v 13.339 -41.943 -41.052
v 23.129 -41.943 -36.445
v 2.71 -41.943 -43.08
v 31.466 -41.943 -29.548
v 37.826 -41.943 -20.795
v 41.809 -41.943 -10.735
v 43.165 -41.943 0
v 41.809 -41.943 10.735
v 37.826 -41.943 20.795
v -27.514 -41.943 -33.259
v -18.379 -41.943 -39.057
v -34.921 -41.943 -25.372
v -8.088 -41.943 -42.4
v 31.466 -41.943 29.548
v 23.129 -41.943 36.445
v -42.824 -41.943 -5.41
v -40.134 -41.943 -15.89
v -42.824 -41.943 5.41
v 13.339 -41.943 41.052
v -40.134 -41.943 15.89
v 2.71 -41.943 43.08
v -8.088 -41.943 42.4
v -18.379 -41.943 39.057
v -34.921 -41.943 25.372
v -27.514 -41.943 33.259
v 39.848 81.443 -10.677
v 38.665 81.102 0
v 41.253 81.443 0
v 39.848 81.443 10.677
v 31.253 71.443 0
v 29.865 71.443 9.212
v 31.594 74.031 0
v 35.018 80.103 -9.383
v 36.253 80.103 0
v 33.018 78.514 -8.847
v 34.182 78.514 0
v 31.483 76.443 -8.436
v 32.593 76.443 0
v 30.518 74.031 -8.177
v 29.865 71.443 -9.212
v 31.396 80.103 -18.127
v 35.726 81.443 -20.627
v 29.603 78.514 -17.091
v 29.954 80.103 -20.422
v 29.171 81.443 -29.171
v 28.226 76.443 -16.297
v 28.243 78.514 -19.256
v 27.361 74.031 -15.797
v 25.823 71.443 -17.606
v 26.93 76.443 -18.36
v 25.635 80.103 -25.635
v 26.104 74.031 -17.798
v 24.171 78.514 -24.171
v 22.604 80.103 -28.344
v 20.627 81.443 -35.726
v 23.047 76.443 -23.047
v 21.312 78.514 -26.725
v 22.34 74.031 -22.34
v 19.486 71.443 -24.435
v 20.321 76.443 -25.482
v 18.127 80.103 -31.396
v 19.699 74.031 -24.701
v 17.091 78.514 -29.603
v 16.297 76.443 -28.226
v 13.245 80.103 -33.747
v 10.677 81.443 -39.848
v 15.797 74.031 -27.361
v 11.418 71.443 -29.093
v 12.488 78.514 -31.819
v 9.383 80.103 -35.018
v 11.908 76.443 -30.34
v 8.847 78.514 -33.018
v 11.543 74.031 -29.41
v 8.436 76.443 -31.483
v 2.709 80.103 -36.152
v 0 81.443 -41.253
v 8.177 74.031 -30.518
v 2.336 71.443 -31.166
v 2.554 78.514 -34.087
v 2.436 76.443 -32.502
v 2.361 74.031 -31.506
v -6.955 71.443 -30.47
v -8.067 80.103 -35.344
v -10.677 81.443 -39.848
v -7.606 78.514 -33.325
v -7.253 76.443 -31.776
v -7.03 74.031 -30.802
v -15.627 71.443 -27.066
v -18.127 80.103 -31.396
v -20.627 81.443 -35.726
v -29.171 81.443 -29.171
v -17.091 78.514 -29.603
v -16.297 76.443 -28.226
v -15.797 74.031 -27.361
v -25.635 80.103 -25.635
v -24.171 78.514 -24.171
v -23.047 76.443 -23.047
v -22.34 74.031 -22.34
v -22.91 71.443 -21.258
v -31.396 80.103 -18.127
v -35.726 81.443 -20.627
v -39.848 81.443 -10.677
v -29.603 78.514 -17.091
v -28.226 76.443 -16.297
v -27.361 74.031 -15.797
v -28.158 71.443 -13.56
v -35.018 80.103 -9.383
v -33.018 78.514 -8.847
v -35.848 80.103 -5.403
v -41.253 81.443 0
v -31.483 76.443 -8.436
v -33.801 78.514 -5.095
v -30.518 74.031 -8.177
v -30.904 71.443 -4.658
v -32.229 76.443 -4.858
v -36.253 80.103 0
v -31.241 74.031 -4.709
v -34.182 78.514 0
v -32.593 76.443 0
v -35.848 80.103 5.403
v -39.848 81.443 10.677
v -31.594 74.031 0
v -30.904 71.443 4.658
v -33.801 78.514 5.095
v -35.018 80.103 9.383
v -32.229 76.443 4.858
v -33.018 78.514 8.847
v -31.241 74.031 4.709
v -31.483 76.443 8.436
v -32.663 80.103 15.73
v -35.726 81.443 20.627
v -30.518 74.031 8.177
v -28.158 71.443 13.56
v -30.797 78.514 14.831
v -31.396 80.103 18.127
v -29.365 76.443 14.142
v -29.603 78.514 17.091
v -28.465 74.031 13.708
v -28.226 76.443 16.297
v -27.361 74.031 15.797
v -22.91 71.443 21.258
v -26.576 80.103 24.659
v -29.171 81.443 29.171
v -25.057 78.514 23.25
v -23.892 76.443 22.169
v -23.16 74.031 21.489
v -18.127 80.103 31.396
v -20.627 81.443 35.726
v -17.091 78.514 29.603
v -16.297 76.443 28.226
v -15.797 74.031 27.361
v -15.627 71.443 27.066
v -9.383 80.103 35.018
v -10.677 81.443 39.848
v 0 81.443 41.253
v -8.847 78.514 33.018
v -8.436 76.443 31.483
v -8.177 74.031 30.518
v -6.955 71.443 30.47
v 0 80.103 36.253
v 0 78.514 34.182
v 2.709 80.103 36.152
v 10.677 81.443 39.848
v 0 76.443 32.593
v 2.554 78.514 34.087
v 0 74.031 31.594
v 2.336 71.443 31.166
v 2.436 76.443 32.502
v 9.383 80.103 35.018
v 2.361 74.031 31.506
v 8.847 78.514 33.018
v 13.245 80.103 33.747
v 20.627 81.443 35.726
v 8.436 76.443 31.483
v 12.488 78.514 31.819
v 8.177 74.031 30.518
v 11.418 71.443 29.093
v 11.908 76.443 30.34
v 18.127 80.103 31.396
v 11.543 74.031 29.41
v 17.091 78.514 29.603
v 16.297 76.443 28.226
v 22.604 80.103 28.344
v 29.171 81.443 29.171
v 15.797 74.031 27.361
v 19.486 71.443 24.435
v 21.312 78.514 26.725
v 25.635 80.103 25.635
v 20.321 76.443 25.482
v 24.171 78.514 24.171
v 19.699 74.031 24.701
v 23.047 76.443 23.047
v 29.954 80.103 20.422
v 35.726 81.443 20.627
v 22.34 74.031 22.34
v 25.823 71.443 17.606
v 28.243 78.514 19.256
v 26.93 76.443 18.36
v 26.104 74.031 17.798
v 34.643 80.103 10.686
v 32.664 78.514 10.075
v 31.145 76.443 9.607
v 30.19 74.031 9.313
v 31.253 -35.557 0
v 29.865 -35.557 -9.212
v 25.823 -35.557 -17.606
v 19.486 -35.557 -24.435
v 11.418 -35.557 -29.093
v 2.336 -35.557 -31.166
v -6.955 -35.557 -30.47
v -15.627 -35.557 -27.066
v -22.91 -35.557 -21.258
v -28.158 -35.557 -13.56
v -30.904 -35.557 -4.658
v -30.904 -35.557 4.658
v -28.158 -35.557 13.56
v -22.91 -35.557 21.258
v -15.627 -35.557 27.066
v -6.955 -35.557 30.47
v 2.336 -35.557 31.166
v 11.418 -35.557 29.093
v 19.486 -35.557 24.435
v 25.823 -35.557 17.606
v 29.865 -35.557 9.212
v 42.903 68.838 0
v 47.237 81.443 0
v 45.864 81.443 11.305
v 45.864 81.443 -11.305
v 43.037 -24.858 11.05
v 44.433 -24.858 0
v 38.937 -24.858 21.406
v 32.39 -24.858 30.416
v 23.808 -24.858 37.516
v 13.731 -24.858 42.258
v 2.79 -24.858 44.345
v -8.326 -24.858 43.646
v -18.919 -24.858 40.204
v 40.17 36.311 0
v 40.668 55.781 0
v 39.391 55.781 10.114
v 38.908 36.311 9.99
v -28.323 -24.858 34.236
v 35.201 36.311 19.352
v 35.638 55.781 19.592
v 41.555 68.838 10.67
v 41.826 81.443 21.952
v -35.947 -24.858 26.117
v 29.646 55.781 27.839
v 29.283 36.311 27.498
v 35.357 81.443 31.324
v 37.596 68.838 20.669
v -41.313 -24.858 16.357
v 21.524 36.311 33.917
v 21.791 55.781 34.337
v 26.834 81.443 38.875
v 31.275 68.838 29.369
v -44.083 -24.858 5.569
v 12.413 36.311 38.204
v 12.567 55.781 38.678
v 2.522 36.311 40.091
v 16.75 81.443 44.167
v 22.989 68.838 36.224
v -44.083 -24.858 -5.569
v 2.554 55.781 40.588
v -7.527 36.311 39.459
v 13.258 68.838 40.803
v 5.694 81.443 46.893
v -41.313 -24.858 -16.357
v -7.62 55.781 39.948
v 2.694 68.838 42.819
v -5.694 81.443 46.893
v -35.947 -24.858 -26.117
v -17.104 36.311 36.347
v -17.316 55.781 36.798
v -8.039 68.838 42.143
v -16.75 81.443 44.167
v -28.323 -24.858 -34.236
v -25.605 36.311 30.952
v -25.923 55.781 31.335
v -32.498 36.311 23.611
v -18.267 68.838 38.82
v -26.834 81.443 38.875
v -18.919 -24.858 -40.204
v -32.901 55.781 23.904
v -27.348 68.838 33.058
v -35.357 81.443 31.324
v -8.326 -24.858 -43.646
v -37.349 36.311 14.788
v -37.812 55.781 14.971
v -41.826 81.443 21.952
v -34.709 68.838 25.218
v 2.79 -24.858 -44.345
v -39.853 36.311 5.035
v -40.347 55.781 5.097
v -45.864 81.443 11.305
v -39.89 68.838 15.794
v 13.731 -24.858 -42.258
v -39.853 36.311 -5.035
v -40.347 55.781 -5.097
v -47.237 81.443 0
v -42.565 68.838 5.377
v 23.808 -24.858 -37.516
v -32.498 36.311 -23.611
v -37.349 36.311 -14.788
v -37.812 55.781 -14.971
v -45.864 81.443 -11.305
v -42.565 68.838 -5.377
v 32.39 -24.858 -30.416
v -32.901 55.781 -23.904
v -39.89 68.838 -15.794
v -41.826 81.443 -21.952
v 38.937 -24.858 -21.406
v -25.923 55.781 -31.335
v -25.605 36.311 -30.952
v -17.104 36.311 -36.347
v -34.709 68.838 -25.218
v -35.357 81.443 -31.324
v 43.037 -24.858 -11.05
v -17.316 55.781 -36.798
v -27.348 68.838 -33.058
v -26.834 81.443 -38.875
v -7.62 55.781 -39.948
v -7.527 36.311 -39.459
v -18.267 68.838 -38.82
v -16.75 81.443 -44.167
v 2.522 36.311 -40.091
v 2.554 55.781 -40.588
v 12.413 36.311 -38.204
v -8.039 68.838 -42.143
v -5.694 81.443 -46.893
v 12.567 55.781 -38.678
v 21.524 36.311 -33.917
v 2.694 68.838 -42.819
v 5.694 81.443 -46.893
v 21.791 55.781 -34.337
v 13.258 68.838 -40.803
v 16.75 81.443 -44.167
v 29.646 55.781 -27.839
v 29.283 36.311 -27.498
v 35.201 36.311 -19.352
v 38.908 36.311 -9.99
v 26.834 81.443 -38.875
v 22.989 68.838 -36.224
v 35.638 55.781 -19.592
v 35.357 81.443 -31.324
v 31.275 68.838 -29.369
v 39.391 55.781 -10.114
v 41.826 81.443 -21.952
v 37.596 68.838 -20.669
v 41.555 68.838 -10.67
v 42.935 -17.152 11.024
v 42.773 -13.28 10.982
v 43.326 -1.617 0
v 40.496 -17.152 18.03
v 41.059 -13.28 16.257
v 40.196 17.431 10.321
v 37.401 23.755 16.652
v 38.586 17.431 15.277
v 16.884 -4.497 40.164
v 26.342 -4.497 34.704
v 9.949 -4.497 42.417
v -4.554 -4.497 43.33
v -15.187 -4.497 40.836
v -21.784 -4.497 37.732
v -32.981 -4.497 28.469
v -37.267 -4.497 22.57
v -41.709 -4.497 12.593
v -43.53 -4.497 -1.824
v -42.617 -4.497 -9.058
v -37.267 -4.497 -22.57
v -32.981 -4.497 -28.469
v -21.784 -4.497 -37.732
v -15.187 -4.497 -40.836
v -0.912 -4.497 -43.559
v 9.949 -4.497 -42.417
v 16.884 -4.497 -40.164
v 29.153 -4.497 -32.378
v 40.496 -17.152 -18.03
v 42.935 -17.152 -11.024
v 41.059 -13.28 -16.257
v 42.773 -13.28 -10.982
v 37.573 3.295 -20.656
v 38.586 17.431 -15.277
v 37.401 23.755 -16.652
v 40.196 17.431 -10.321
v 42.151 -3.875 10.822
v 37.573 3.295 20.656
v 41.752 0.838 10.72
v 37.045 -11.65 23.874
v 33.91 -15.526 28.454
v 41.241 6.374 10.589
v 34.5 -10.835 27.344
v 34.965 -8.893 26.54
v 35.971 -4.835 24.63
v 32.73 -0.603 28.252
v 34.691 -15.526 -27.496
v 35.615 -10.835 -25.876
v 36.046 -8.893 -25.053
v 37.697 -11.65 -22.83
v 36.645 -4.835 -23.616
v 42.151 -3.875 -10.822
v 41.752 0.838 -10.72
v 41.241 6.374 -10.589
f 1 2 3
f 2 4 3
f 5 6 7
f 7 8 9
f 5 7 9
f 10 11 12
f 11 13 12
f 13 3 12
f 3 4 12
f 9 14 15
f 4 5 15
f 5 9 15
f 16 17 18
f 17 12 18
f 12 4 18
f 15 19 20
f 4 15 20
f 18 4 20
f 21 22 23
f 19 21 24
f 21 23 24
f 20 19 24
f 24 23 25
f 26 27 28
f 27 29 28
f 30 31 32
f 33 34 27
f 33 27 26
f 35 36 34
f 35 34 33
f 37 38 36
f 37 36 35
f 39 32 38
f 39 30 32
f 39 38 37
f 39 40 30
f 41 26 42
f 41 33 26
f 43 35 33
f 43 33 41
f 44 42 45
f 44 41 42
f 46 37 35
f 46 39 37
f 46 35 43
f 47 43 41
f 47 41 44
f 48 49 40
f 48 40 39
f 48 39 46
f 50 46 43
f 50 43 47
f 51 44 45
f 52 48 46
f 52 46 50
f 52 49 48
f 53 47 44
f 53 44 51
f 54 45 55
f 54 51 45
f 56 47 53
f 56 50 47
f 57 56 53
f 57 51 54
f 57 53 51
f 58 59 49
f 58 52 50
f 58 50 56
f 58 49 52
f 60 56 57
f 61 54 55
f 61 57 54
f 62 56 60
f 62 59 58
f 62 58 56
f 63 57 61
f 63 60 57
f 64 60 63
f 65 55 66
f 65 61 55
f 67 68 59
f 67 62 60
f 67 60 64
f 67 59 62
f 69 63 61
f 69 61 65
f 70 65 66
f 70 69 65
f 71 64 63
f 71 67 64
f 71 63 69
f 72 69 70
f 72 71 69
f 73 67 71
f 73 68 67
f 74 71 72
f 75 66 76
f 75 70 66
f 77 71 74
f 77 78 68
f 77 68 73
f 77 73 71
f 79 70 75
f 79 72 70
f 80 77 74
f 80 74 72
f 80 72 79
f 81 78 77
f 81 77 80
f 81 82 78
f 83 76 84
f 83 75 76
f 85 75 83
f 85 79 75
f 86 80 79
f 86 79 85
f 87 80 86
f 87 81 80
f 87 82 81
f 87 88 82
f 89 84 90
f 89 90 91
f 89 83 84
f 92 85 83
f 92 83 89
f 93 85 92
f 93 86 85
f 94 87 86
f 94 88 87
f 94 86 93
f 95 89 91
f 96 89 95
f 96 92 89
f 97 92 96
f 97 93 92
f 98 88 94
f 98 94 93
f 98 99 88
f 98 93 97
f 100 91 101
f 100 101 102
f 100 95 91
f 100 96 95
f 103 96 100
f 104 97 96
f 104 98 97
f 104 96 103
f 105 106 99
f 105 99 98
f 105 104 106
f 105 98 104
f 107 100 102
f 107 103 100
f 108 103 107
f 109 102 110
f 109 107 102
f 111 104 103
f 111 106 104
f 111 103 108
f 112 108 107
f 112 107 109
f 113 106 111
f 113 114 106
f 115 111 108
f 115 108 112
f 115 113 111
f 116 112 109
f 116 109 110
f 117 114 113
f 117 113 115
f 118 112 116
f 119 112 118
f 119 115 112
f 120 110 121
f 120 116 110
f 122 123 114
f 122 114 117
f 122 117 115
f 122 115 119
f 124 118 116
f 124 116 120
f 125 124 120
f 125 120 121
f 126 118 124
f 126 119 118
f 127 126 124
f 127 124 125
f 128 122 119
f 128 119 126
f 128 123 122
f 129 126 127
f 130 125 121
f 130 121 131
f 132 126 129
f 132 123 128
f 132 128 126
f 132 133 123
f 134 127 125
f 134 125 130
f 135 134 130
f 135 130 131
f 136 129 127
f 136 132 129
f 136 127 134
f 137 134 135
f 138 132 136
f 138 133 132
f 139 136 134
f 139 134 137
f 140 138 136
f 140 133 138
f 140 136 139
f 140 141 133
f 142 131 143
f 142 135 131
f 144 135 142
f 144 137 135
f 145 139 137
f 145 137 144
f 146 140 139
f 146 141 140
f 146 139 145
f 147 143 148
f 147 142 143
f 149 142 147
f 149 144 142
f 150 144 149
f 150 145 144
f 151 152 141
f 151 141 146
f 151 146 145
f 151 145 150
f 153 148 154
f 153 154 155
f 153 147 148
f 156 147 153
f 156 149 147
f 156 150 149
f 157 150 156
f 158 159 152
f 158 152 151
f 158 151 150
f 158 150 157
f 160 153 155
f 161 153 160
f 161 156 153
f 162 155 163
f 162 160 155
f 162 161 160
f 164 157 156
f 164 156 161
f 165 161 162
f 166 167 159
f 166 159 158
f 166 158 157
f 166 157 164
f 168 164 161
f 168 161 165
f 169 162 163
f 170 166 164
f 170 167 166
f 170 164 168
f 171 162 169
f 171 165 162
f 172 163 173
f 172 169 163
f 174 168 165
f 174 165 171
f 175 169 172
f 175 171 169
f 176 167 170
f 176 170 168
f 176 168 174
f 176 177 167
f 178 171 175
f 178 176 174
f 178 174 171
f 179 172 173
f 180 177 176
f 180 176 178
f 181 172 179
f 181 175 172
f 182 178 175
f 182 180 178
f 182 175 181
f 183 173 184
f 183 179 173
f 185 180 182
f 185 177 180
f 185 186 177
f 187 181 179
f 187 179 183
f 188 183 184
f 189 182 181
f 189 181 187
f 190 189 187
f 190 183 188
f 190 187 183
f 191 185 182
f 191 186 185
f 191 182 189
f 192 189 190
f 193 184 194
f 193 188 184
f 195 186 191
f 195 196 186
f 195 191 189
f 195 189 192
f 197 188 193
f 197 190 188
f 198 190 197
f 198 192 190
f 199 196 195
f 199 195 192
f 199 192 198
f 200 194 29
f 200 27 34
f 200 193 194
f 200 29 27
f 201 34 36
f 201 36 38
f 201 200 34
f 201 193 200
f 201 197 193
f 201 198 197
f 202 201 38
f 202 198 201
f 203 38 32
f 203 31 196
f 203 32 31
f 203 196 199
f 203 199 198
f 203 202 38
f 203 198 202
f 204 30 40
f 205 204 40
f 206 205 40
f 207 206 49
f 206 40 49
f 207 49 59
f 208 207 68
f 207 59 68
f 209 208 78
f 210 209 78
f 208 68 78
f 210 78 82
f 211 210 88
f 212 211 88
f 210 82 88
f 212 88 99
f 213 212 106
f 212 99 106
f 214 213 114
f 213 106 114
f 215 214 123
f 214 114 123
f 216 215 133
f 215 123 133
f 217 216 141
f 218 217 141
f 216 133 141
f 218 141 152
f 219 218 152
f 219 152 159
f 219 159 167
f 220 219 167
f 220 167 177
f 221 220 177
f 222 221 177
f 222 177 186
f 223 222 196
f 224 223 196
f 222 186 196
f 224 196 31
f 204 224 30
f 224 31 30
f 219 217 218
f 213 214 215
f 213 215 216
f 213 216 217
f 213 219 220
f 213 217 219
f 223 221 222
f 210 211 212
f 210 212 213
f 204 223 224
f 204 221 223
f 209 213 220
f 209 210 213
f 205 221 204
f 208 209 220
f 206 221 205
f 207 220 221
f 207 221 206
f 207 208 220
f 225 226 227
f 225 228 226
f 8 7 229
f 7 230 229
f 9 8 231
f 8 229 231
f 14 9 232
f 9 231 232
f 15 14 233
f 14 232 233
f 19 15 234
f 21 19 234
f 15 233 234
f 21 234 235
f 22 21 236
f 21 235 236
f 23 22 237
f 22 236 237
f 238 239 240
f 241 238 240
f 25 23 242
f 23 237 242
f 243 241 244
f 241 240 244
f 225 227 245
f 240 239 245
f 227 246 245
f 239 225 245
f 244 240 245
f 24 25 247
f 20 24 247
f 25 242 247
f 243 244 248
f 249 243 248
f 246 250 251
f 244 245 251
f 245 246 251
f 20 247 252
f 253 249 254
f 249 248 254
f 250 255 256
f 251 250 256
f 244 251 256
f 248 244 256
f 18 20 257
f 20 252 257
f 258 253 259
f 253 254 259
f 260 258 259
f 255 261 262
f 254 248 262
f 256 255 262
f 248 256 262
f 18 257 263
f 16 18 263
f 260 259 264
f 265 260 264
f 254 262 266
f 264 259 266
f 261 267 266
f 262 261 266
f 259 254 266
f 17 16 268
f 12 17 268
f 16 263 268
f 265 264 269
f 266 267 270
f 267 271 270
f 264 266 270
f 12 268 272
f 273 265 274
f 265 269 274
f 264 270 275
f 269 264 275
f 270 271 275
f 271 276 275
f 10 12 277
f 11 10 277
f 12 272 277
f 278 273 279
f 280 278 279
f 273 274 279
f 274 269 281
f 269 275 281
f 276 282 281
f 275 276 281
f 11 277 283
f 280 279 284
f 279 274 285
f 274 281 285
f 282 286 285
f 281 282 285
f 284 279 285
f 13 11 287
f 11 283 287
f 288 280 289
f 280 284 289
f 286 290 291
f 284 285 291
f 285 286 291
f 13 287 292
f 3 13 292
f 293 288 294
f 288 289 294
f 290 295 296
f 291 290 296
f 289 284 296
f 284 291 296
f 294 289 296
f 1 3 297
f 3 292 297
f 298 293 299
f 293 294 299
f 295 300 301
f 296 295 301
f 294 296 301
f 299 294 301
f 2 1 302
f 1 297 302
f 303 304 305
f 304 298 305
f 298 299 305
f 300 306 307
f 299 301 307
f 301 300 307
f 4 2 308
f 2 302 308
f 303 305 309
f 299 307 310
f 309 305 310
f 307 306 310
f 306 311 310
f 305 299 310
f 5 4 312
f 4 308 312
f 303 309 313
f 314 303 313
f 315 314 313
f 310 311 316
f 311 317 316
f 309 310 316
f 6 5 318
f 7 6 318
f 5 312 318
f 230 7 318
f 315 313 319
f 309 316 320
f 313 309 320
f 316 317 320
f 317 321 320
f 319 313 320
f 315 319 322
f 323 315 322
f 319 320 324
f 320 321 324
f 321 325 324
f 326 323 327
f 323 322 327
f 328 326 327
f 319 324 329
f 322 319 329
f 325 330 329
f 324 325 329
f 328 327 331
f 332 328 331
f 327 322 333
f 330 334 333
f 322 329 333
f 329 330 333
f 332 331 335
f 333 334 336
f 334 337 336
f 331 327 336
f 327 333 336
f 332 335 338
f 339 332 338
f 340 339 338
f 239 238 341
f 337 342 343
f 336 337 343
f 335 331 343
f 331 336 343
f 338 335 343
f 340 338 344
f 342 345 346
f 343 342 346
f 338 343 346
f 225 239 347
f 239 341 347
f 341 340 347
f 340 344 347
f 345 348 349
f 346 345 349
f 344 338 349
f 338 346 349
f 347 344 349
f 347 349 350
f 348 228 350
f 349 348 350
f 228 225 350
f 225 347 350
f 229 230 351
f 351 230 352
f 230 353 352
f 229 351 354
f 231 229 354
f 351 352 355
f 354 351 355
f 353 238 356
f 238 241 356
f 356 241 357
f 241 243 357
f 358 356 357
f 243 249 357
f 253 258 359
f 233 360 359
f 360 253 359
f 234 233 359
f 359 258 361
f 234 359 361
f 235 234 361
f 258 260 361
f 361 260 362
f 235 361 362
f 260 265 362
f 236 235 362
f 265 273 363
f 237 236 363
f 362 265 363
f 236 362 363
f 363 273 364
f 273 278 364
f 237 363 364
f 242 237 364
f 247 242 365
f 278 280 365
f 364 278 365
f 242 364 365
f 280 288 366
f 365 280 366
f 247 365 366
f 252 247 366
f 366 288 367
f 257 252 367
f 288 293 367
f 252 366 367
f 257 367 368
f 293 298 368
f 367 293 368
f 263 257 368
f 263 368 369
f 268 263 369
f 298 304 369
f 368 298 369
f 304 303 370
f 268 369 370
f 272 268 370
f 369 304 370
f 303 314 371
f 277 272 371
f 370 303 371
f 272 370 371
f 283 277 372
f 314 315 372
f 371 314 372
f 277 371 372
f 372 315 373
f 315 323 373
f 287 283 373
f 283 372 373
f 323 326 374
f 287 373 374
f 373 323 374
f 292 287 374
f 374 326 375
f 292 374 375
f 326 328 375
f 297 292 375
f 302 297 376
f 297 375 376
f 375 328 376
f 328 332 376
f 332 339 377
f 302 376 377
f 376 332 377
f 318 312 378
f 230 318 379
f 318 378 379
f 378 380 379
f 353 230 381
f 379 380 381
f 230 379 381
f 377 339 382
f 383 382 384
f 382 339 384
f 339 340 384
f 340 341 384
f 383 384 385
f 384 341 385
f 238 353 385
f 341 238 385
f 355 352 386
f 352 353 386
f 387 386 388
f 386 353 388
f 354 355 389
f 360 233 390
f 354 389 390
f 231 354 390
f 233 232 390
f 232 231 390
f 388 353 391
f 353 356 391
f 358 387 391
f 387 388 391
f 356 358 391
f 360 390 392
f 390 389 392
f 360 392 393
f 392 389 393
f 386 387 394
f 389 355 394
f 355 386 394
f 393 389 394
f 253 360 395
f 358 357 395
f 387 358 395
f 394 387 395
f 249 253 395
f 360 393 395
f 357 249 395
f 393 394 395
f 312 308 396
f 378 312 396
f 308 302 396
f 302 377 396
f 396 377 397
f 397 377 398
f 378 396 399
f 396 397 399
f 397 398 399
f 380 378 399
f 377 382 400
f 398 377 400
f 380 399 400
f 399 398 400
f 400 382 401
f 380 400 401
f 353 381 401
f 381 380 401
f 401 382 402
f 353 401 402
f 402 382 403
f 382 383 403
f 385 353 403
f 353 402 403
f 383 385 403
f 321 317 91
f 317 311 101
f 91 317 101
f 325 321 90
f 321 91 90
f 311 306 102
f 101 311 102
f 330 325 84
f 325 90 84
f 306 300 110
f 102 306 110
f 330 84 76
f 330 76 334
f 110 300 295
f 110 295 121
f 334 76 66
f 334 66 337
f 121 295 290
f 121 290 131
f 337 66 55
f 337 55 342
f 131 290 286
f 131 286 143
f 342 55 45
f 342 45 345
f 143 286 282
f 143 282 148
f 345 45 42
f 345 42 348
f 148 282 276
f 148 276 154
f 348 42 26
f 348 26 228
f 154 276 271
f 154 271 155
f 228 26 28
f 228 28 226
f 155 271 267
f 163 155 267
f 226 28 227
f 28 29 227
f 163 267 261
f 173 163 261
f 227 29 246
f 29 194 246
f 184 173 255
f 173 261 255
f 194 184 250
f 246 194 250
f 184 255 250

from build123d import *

# Parameters (mm, degrees)
SKETCH2_R          = 31.253383714
CUT_EXTRUDE1_DEPTH = 117
FILLET1_R          = 10


with BuildPart() as part:
    # Sketch1 → Revolve1 (revolve)
    with BuildSketch(Plane.XY):
        with BuildLine():
            Line((0, -41.943209239), (43.16485611, -41.943209239))
            add(Edge.make_bspline(
                [(43.16485611, -41.943209239), (49.298367105, -1.238999909), (30.381887642, 43.902165166), (47.237012347, 81.443124736)],
                knots=[0, 0, 0, 0, 1, 1, 1, 1], degree=3))
            Line((47.237012347, 81.443124736), (0, 81.443124736))
            Line((0, 81.443124736), (0, -41.943209239))
        make_face()
    revolve(axis=Axis((0, 86.736927844, 0), (0, -1, 0)))

    # Sketch2 → Cut-Extrude1 (cut)
    with BuildSketch(Plane(origin=(0, 81.443124736, 0), x_dir=(1, 0, 0), z_dir=(0, 1, 0))):
        Circle(SKETCH2_R)
    extrude(amount=-CUT_EXTRUDE1_DEPTH, mode=Mode.SUBTRACT)

    # Fillet1
    fillet1_edges = [part.edges().sort_by_distance(p)[0] for p in [
        (-31.253383714, 81.443124736, 0),
    ]]
    fillet(fillet1_edges, radius=FILLET1_R)


solid = part.part
